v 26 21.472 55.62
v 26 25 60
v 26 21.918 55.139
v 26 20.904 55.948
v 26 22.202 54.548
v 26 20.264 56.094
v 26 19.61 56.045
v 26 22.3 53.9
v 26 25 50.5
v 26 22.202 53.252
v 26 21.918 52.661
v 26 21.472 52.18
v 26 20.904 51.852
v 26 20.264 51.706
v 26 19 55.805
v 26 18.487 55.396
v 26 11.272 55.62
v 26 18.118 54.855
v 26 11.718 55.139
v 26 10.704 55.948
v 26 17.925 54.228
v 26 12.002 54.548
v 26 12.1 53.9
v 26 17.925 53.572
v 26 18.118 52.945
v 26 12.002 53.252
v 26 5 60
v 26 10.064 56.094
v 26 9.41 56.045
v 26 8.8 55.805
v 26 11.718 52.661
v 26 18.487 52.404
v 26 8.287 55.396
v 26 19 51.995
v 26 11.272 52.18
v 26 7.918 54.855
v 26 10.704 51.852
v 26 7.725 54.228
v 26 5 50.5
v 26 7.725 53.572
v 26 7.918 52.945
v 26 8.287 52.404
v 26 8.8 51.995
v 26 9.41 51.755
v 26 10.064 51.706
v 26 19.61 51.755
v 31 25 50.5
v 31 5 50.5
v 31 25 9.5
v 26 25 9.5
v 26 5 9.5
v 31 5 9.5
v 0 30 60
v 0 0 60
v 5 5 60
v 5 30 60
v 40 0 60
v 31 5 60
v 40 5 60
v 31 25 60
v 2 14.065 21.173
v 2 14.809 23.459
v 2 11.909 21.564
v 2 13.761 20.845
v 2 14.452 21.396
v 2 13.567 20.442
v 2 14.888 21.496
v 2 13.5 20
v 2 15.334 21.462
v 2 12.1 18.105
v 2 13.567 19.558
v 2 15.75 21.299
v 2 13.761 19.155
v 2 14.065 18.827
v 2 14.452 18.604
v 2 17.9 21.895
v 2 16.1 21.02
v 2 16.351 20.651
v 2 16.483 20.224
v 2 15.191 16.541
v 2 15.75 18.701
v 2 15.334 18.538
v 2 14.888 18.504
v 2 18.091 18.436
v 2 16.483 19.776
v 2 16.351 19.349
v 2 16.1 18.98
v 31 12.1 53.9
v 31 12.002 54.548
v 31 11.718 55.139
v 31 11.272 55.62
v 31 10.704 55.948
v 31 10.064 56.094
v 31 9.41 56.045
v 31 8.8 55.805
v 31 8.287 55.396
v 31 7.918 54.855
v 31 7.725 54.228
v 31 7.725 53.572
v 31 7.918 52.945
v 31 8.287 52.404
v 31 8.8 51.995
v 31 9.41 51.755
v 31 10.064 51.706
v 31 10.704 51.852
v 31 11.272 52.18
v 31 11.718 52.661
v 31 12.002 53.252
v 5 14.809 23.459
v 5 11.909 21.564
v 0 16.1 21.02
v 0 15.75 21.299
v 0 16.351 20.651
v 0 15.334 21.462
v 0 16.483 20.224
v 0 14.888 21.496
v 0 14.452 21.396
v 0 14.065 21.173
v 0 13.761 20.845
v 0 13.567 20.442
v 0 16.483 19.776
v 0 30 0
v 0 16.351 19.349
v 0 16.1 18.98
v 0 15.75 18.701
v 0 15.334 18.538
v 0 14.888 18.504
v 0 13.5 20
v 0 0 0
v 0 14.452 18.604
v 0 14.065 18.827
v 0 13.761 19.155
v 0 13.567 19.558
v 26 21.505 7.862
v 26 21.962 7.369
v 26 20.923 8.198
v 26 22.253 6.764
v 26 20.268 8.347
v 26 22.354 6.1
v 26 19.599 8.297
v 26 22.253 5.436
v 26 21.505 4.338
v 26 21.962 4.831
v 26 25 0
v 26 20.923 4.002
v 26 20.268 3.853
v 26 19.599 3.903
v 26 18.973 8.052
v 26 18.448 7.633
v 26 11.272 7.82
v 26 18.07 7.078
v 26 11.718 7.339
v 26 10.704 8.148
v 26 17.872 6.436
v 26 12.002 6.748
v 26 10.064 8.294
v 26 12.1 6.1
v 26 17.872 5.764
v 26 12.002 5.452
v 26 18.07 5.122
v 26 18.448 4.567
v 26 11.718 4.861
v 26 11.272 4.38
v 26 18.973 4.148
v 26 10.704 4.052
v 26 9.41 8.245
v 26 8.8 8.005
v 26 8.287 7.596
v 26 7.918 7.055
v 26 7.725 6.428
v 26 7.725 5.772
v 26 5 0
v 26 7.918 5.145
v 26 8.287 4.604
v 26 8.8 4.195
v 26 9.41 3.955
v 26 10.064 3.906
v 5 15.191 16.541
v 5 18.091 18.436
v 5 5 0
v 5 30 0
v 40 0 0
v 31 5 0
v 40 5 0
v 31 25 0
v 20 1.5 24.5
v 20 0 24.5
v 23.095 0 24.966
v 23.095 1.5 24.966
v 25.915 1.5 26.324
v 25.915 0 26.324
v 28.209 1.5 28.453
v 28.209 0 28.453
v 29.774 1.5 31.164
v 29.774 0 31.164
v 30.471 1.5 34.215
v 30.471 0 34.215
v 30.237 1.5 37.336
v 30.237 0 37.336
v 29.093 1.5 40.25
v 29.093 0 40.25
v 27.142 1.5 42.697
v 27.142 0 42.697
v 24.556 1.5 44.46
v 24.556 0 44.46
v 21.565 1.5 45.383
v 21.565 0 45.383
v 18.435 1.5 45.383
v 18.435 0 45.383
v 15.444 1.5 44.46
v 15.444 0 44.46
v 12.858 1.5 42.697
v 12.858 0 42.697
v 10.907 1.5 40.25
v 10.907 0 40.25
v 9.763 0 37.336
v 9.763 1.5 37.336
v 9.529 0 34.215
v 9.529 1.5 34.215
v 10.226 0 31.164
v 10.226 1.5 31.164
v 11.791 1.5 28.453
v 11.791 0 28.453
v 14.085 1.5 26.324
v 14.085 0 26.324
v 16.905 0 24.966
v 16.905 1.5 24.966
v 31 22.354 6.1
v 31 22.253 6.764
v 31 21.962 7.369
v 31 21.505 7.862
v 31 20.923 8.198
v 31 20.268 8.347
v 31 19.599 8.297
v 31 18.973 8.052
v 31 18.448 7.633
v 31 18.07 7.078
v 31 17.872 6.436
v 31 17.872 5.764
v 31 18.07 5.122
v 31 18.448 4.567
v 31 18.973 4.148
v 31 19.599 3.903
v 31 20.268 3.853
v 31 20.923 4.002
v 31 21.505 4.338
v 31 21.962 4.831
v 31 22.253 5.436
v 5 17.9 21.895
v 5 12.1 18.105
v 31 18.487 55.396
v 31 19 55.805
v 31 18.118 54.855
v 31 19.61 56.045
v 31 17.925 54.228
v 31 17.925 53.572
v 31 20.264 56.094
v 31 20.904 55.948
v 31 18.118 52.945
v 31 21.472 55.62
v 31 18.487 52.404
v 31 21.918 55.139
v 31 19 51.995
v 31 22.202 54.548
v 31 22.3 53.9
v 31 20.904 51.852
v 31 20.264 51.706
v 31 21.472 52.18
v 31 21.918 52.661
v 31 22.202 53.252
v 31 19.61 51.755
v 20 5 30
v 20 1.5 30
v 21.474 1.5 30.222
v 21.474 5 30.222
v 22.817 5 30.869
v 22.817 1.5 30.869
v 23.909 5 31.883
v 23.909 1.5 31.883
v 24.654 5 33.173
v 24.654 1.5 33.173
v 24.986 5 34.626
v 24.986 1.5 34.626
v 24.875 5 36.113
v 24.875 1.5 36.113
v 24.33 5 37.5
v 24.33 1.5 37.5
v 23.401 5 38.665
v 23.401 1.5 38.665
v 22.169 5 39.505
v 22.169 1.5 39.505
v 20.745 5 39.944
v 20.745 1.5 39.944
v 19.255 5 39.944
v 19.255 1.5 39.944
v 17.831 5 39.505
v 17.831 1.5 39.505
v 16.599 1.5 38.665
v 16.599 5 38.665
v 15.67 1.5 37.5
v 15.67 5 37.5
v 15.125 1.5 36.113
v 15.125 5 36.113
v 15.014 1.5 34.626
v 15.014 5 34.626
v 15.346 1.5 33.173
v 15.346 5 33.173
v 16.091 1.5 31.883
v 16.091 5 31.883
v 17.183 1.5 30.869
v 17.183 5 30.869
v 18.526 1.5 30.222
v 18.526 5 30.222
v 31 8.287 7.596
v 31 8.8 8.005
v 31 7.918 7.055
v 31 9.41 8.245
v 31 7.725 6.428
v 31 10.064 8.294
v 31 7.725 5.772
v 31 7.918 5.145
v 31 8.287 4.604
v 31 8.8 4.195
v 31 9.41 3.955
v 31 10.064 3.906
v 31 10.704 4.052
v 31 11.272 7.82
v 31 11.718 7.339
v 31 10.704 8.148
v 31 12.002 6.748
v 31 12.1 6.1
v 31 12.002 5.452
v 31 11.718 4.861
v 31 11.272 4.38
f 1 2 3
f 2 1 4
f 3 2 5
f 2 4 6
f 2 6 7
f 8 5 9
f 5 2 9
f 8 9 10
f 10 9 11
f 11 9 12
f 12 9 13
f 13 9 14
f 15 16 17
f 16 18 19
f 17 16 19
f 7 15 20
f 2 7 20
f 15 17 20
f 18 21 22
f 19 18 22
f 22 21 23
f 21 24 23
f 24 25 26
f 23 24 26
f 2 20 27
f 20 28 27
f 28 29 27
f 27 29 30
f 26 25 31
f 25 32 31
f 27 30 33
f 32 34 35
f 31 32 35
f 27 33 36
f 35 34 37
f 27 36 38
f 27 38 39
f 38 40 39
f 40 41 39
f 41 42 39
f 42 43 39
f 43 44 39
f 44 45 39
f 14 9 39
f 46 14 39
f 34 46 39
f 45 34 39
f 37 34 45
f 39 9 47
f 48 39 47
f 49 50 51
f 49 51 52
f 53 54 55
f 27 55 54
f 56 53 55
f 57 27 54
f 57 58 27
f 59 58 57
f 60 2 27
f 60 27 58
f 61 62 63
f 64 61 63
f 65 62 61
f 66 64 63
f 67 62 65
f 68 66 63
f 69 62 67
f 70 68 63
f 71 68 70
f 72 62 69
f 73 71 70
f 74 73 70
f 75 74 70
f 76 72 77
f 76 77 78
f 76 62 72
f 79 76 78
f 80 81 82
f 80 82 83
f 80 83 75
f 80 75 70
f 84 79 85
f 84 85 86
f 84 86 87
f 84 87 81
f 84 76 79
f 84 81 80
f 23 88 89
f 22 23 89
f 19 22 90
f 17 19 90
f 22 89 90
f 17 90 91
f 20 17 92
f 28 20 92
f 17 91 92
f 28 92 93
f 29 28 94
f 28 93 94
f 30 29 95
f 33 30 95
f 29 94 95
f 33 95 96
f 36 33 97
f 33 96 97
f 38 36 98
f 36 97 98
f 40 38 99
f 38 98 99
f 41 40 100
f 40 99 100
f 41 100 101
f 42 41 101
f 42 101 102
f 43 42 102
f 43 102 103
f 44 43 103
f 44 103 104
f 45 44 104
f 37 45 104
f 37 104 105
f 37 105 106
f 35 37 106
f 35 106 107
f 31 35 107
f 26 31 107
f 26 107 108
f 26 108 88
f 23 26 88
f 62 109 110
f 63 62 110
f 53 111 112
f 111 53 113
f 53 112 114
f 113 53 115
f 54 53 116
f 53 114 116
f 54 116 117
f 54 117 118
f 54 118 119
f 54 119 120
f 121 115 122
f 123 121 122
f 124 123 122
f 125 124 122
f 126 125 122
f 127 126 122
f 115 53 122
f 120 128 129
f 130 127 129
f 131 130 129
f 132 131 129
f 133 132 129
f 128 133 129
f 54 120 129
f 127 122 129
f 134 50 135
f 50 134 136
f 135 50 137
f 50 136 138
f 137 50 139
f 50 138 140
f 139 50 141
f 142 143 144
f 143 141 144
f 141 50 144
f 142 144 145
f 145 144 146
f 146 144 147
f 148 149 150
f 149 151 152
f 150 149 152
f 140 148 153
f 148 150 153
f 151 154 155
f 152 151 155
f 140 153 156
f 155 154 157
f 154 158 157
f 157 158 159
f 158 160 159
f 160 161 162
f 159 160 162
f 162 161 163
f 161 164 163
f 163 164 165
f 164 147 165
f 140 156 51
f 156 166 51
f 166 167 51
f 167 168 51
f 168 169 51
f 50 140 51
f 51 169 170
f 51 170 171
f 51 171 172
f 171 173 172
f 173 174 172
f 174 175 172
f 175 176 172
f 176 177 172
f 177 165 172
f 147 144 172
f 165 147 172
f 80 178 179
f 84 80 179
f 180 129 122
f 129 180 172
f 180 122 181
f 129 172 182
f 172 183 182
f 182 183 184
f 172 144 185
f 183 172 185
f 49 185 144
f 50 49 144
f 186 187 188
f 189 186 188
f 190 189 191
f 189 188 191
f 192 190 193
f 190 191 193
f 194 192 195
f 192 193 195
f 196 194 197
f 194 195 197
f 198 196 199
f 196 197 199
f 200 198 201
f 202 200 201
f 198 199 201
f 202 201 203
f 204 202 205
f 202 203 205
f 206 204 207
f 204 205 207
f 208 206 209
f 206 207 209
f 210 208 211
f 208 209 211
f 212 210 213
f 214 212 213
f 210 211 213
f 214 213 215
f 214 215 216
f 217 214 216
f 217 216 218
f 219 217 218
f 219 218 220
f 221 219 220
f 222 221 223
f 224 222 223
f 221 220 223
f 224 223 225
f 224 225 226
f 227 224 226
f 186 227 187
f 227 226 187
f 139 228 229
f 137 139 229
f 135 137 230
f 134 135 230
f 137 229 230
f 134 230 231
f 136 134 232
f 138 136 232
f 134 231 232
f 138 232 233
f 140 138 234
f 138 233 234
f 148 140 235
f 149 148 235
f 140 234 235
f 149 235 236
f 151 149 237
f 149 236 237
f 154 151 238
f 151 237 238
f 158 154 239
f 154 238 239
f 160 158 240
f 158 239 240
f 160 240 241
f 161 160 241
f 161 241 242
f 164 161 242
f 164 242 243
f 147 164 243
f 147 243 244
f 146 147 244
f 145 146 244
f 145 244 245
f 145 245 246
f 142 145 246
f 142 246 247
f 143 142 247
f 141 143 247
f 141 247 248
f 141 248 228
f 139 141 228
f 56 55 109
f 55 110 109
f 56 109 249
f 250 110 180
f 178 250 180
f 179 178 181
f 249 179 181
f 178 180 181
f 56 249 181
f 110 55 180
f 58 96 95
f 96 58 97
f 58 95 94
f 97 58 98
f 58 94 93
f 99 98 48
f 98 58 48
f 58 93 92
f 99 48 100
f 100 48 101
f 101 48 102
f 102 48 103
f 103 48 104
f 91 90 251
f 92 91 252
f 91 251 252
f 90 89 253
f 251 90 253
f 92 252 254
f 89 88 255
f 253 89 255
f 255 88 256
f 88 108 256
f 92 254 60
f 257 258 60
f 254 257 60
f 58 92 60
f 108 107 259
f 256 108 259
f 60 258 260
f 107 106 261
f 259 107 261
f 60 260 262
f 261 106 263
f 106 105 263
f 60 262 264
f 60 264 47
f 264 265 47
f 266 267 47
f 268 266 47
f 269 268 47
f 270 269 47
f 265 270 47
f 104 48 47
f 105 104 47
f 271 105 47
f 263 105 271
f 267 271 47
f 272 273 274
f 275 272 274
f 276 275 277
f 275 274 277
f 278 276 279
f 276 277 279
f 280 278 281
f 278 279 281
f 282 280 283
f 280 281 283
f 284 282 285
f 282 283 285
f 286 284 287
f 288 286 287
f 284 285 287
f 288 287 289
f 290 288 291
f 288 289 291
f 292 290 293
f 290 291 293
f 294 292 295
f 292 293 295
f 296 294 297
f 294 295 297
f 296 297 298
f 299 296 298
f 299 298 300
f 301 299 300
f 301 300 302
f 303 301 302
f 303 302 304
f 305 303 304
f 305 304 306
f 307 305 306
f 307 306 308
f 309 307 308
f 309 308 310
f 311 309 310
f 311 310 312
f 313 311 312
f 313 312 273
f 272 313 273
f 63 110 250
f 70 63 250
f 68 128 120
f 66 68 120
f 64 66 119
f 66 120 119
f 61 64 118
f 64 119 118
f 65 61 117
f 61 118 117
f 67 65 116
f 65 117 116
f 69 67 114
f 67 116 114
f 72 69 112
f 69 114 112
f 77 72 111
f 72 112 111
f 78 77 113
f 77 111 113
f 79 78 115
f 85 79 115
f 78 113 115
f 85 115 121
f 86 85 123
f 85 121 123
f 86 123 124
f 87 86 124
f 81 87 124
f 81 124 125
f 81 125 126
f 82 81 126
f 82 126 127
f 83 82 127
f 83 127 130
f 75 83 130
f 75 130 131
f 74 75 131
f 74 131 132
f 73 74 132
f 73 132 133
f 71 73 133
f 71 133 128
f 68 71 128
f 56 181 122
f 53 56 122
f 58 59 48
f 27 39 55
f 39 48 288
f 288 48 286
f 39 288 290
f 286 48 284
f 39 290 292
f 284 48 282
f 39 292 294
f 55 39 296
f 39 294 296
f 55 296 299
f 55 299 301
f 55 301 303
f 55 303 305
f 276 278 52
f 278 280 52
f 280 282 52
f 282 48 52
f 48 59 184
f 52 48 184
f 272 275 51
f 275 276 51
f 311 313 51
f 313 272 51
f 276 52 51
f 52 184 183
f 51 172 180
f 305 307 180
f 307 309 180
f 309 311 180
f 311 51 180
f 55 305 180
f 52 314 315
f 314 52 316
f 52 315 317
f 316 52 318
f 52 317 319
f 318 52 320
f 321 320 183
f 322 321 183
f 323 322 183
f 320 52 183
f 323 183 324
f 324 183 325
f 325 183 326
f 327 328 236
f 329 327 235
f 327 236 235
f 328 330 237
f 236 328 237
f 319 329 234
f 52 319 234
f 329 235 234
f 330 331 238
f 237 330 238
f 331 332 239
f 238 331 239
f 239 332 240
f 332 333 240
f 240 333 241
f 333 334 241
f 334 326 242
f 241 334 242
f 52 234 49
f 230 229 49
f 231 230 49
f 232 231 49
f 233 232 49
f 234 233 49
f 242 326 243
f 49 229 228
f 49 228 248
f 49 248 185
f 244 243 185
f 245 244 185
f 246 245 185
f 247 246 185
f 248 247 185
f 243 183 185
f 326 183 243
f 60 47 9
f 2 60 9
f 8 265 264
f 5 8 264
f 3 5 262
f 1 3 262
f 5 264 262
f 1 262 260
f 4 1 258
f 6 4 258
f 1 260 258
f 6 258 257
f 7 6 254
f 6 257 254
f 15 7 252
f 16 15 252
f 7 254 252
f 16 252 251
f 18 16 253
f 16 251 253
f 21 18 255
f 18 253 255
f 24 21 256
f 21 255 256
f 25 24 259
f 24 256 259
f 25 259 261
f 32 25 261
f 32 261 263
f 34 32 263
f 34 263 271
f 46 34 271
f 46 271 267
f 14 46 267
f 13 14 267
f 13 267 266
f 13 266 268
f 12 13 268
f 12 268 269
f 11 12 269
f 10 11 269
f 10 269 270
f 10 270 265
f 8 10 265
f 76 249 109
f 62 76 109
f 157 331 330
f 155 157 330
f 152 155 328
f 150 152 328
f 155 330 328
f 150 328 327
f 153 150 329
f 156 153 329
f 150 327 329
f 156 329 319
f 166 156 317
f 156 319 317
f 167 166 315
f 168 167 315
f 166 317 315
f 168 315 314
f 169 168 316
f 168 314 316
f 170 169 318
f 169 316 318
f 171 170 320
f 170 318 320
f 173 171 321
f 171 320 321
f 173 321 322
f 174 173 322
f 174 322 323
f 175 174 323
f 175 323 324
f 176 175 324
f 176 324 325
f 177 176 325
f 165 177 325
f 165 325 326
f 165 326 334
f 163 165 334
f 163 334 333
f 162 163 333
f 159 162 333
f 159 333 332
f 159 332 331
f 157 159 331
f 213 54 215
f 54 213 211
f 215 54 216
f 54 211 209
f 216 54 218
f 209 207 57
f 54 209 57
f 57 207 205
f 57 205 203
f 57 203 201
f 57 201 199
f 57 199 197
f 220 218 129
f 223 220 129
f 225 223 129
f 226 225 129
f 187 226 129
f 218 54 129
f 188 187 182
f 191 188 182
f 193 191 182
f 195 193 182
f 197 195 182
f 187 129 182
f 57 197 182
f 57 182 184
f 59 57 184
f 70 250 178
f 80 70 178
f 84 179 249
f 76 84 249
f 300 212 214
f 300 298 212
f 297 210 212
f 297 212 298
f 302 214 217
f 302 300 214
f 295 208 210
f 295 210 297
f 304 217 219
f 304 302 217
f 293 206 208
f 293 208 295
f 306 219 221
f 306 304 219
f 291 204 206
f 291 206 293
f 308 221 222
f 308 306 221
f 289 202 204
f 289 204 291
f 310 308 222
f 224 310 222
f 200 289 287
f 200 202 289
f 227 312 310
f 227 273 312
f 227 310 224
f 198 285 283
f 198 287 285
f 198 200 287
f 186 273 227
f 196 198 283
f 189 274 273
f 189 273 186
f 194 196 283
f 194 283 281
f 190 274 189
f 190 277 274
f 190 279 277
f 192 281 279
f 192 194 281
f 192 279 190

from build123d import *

# Parameters (mm, degrees)
SALIENTE_EXTRUIR1_DEPTH = 60
CROQUIS2_W              = 5
CROQUIS2_H              = 41
CORTAR_EXTRUIR1_DEPTH   = 20
CROQUIS4_R              = 10.5
CORTAR_EXTRUIR3_DEPTH   = 1.5
CROQUIS5_R              = 5
CORTAR_EXTRUIR4_DEPTH   = 51.5
CROQUIS7_R              = 2.2
CROQUIS7_R_2            = 2.253524607
CORTAR_EXTRUIR5_DEPTH   = 10
CROQUIS8_R              = 1.5
CORTAR_EXTRUIR6_DEPTH   = 10
CORTAR_EXTRUIR7_DEPTH   = 3


with BuildPart() as part:
    # Croquis1 → Saliente-Extruir1 (new body)
    with BuildSketch(Plane.XY):
        Polygon((0, 0), (40, 0), (40, 5), (31, 5), (31, 25), (26, 25), (26, 5), (5, 5), (5, 30), (0, 30), align=None)
    extrude(amount=SALIENTE_EXTRUIR1_DEPTH)

    # Croquis2 → Cortar-Extruir1 (cut)
    with BuildSketch(Plane(origin=(0, 25, 0), x_dir=(1, 0, 0), z_dir=(0, 1, 0))):
        with Locations((28.5, -30)):
            Rectangle(CROQUIS2_W, CROQUIS2_H)
    extrude(amount=-CORTAR_EXTRUIR1_DEPTH, mode=Mode.SUBTRACT)

    # Croquis4 → Cortar-Extruir3 (cut)
    with BuildSketch(Plane.XZ):
        with Locations(Location((20, 35, 0), (0, 0, 270))):
            Circle(CROQUIS4_R)
    extrude(amount=-CORTAR_EXTRUIR3_DEPTH, mode=Mode.SUBTRACT)

    # Croquis5 → Cortar-Extruir4 (cut)
    with BuildSketch(Plane.XZ.offset(-1.5)):
        with Locations(Location((20, 35, 0), (0, 0, 270))):
            Circle(CROQUIS5_R)
    extrude(amount=-CORTAR_EXTRUIR4_DEPTH, mode=Mode.SUBTRACT)

    # Croquis7 → Cortar-Extruir5 (cut)
    with BuildSketch(Plane(origin=(31, 0, 0), x_dir=(0, 0, -1), z_dir=(1, 0, 0))):
        with Locations(Location((-53.9, 20.1, 0), (0, 0, 90))):
            Circle(CROQUIS7_R)
        with Locations(Location((-53.9, 9.9, 0), (0, 0, 90))):
            Circle(CROQUIS7_R)
        with Locations(Location((-6.1, 9.9, 0), (0, 0, 90))):
            Circle(CROQUIS7_R)
        with Locations(Location((-6.1, 20.1, 0), (0, 0, 90))):
            Circle(CROQUIS7_R_2)
    extrude(amount=-CORTAR_EXTRUIR5_DEPTH, mode=Mode.SUBTRACT)

    # Croquis8 → Cortar-Extruir6 (cut)
    with BuildSketch(Plane.ZY):
        with Locations(Location((20, 15, 0), (0, 0, 270))):
            Circle(CROQUIS8_R)
    extrude(amount=-CORTAR_EXTRUIR6_DEPTH, mode=Mode.SUBTRACT)

    # Croquis9 → Cortar-Extruir7 (cut)
    with BuildSketch(Plane(origin=(5, 0, 0), x_dir=(0, 0, -1), z_dir=(1, 0, 0))):
        Polygon((-18.435990885, 18.090934404), (-21.894823157, 17.899938827), (-23.458832273, 14.809004424), (-21.564009115, 11.909065596), (-18.105176843, 12.100061173), (-16.541167727, 15.190995576), align=None)
    extrude(amount=-CORTAR_EXTRUIR7_DEPTH, mode=Mode.SUBTRACT)


solid = part.part
